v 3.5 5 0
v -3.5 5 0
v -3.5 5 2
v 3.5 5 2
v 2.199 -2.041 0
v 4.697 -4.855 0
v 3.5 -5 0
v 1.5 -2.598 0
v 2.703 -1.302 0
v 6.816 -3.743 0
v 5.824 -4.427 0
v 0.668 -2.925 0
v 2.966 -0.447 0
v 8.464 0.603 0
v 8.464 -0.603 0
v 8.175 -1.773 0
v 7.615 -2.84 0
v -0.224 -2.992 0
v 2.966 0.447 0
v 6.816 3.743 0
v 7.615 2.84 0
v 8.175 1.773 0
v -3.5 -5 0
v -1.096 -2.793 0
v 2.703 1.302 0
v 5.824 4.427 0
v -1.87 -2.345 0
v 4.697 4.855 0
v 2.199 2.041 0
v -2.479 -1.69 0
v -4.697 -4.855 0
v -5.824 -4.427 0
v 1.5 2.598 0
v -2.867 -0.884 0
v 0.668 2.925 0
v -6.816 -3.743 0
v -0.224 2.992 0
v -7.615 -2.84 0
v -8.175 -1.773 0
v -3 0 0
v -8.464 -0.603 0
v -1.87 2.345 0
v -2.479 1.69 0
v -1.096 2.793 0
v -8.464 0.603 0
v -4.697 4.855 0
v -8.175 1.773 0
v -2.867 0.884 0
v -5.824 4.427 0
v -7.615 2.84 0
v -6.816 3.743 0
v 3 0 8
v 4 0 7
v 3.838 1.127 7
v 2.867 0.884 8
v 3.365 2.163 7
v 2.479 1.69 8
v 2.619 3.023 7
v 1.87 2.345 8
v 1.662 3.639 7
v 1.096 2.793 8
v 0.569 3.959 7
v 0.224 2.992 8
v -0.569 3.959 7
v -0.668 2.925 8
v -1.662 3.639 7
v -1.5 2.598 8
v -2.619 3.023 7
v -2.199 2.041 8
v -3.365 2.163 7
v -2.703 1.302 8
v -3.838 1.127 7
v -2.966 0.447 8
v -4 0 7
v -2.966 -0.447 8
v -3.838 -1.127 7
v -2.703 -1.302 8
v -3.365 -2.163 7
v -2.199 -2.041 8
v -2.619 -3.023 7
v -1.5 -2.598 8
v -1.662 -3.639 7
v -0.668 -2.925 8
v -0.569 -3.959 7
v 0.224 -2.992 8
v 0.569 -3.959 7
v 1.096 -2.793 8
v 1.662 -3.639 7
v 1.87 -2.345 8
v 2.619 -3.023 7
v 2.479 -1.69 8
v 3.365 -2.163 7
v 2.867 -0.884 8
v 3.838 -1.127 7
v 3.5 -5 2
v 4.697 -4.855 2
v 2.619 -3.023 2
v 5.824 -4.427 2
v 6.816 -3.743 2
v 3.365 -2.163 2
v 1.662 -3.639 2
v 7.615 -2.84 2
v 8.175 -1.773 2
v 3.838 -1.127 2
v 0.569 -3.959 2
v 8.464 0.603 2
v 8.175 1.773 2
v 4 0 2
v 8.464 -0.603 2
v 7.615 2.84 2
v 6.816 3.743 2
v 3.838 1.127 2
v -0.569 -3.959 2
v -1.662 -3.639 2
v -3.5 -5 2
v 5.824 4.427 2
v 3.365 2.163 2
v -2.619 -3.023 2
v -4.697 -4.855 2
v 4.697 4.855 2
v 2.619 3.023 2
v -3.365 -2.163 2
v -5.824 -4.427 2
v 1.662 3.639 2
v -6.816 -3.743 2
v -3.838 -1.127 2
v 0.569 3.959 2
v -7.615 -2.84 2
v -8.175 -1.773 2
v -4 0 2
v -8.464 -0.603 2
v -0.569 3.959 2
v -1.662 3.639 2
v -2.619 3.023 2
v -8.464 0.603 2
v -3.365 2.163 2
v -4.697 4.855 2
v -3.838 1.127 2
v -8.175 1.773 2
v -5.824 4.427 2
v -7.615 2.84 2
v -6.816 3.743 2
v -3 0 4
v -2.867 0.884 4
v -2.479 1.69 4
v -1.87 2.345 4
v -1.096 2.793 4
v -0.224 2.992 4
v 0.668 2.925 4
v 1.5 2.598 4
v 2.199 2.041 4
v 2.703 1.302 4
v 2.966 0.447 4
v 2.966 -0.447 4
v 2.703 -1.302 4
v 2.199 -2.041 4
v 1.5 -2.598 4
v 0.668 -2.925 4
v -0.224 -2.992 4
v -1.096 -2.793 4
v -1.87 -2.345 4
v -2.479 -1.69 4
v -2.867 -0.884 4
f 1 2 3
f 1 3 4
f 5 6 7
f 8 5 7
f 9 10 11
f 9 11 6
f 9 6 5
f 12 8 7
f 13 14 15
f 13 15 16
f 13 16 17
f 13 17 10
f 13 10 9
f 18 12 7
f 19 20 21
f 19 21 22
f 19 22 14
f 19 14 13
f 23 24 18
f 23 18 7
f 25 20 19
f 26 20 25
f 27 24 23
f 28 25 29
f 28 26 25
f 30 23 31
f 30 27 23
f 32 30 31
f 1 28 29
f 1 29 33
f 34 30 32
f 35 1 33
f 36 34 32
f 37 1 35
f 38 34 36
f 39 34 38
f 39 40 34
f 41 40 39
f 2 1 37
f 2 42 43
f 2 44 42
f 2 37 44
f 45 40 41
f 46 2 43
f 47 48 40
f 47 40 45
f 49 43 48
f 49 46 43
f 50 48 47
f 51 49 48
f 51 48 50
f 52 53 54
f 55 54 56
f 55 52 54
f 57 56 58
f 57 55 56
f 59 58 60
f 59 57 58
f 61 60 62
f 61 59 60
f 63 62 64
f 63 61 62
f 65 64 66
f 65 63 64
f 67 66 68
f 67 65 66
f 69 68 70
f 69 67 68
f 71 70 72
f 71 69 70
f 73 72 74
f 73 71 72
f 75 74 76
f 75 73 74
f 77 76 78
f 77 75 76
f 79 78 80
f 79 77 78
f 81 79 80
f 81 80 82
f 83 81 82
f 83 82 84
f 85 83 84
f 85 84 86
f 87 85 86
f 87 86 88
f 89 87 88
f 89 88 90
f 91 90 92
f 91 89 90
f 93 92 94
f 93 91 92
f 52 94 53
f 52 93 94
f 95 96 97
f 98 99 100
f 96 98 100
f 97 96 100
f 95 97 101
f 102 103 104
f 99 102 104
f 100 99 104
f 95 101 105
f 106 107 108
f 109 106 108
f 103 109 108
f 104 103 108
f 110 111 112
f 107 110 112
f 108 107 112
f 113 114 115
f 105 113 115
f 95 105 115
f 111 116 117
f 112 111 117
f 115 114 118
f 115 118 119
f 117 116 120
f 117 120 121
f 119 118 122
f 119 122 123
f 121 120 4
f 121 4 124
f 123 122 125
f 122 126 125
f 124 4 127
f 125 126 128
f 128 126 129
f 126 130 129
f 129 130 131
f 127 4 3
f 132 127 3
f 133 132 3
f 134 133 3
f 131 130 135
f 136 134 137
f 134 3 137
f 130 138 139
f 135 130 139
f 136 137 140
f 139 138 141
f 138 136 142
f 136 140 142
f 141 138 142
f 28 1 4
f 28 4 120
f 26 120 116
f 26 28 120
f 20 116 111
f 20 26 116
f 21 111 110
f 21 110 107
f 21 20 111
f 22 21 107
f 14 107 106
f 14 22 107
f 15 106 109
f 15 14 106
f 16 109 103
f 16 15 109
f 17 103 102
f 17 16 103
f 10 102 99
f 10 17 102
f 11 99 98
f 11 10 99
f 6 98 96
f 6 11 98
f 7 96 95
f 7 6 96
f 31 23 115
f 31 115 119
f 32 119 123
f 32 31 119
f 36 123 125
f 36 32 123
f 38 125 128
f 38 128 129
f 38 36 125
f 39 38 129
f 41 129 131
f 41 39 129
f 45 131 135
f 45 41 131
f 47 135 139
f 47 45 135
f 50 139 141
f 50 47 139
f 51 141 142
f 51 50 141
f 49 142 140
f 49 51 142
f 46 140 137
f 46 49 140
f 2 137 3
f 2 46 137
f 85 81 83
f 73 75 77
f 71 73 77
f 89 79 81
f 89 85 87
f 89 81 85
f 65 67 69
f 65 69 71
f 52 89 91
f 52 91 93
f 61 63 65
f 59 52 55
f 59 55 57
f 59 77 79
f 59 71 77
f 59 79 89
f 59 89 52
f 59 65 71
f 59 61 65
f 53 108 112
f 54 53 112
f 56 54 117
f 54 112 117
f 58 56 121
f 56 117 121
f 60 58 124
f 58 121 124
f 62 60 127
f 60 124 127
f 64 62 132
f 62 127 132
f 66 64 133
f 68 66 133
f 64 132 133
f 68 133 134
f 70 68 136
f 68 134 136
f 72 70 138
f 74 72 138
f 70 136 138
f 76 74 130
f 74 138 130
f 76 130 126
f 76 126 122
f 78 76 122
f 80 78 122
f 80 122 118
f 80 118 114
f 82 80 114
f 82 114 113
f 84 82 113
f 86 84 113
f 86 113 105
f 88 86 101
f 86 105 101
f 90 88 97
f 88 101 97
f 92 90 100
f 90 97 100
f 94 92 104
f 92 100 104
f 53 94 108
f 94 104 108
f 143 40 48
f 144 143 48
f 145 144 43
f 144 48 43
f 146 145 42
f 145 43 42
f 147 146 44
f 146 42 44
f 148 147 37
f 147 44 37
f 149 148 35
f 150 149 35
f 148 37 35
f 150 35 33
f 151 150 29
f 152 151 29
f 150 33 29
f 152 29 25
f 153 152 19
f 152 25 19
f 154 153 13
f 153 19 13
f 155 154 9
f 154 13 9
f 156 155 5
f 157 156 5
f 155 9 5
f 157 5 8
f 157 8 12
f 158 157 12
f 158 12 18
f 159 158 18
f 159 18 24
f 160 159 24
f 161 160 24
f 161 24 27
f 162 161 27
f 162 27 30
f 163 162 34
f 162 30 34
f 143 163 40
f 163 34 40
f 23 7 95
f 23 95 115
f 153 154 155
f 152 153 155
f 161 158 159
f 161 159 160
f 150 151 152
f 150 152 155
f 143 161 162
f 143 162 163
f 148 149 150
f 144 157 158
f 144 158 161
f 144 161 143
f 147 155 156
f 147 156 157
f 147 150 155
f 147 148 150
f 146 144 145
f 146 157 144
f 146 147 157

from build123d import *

# Parameters (mm, degrees)
EXTRUDE_1_DEPTH     = 2
SKETCH_2_R          = 4
EXTRUDE_2_DEPTH     = 6
SKETCH_3_R          = 3
CUT_EXTRUDE_1_DEPTH = 4
CHAMFER_1_SIZE      = 1


with BuildPart() as part:
    # Эскиз1 → Бобышка-Вытянуть1 (new body)
    with BuildSketch(Plane.XY):
        with BuildLine():
            Line((-3.5, 5), (3.5, 5))
            ThreePointArc((3.5, 5), (8.5, 0), (3.5, -5))
            Line((3.5, -5), (-3.5, -5))
            ThreePointArc((-3.5, -5), (-8.5, 0), (-3.5, 5))
        make_face()
    extrude(amount=EXTRUDE_1_DEPTH)

    # Эскиз2 → Бобышка-Вытянуть2 (add)
    with BuildSketch(Plane.XY.offset(2)):
        Circle(SKETCH_2_R)
    extrude(amount=EXTRUDE_2_DEPTH)

    # Эскиз3 → Вырез-Вытянуть1 (cut)
    with BuildSketch(Plane(origin=(0, 0, 0), x_dir=(-1, 0, 0), z_dir=(0, 0, -1))):
        Circle(SKETCH_3_R)
    extrude(amount=-CUT_EXTRUDE_1_DEPTH, mode=Mode.SUBTRACT)

    # Фаска1
    chamfer_1_edges = [part.edges().sort_by_distance(p)[0] for p in [
        (-4, 0, 8),
    ]]
    chamfer(chamfer_1_edges, length=CHAMFER_1_SIZE)


solid = part.part
